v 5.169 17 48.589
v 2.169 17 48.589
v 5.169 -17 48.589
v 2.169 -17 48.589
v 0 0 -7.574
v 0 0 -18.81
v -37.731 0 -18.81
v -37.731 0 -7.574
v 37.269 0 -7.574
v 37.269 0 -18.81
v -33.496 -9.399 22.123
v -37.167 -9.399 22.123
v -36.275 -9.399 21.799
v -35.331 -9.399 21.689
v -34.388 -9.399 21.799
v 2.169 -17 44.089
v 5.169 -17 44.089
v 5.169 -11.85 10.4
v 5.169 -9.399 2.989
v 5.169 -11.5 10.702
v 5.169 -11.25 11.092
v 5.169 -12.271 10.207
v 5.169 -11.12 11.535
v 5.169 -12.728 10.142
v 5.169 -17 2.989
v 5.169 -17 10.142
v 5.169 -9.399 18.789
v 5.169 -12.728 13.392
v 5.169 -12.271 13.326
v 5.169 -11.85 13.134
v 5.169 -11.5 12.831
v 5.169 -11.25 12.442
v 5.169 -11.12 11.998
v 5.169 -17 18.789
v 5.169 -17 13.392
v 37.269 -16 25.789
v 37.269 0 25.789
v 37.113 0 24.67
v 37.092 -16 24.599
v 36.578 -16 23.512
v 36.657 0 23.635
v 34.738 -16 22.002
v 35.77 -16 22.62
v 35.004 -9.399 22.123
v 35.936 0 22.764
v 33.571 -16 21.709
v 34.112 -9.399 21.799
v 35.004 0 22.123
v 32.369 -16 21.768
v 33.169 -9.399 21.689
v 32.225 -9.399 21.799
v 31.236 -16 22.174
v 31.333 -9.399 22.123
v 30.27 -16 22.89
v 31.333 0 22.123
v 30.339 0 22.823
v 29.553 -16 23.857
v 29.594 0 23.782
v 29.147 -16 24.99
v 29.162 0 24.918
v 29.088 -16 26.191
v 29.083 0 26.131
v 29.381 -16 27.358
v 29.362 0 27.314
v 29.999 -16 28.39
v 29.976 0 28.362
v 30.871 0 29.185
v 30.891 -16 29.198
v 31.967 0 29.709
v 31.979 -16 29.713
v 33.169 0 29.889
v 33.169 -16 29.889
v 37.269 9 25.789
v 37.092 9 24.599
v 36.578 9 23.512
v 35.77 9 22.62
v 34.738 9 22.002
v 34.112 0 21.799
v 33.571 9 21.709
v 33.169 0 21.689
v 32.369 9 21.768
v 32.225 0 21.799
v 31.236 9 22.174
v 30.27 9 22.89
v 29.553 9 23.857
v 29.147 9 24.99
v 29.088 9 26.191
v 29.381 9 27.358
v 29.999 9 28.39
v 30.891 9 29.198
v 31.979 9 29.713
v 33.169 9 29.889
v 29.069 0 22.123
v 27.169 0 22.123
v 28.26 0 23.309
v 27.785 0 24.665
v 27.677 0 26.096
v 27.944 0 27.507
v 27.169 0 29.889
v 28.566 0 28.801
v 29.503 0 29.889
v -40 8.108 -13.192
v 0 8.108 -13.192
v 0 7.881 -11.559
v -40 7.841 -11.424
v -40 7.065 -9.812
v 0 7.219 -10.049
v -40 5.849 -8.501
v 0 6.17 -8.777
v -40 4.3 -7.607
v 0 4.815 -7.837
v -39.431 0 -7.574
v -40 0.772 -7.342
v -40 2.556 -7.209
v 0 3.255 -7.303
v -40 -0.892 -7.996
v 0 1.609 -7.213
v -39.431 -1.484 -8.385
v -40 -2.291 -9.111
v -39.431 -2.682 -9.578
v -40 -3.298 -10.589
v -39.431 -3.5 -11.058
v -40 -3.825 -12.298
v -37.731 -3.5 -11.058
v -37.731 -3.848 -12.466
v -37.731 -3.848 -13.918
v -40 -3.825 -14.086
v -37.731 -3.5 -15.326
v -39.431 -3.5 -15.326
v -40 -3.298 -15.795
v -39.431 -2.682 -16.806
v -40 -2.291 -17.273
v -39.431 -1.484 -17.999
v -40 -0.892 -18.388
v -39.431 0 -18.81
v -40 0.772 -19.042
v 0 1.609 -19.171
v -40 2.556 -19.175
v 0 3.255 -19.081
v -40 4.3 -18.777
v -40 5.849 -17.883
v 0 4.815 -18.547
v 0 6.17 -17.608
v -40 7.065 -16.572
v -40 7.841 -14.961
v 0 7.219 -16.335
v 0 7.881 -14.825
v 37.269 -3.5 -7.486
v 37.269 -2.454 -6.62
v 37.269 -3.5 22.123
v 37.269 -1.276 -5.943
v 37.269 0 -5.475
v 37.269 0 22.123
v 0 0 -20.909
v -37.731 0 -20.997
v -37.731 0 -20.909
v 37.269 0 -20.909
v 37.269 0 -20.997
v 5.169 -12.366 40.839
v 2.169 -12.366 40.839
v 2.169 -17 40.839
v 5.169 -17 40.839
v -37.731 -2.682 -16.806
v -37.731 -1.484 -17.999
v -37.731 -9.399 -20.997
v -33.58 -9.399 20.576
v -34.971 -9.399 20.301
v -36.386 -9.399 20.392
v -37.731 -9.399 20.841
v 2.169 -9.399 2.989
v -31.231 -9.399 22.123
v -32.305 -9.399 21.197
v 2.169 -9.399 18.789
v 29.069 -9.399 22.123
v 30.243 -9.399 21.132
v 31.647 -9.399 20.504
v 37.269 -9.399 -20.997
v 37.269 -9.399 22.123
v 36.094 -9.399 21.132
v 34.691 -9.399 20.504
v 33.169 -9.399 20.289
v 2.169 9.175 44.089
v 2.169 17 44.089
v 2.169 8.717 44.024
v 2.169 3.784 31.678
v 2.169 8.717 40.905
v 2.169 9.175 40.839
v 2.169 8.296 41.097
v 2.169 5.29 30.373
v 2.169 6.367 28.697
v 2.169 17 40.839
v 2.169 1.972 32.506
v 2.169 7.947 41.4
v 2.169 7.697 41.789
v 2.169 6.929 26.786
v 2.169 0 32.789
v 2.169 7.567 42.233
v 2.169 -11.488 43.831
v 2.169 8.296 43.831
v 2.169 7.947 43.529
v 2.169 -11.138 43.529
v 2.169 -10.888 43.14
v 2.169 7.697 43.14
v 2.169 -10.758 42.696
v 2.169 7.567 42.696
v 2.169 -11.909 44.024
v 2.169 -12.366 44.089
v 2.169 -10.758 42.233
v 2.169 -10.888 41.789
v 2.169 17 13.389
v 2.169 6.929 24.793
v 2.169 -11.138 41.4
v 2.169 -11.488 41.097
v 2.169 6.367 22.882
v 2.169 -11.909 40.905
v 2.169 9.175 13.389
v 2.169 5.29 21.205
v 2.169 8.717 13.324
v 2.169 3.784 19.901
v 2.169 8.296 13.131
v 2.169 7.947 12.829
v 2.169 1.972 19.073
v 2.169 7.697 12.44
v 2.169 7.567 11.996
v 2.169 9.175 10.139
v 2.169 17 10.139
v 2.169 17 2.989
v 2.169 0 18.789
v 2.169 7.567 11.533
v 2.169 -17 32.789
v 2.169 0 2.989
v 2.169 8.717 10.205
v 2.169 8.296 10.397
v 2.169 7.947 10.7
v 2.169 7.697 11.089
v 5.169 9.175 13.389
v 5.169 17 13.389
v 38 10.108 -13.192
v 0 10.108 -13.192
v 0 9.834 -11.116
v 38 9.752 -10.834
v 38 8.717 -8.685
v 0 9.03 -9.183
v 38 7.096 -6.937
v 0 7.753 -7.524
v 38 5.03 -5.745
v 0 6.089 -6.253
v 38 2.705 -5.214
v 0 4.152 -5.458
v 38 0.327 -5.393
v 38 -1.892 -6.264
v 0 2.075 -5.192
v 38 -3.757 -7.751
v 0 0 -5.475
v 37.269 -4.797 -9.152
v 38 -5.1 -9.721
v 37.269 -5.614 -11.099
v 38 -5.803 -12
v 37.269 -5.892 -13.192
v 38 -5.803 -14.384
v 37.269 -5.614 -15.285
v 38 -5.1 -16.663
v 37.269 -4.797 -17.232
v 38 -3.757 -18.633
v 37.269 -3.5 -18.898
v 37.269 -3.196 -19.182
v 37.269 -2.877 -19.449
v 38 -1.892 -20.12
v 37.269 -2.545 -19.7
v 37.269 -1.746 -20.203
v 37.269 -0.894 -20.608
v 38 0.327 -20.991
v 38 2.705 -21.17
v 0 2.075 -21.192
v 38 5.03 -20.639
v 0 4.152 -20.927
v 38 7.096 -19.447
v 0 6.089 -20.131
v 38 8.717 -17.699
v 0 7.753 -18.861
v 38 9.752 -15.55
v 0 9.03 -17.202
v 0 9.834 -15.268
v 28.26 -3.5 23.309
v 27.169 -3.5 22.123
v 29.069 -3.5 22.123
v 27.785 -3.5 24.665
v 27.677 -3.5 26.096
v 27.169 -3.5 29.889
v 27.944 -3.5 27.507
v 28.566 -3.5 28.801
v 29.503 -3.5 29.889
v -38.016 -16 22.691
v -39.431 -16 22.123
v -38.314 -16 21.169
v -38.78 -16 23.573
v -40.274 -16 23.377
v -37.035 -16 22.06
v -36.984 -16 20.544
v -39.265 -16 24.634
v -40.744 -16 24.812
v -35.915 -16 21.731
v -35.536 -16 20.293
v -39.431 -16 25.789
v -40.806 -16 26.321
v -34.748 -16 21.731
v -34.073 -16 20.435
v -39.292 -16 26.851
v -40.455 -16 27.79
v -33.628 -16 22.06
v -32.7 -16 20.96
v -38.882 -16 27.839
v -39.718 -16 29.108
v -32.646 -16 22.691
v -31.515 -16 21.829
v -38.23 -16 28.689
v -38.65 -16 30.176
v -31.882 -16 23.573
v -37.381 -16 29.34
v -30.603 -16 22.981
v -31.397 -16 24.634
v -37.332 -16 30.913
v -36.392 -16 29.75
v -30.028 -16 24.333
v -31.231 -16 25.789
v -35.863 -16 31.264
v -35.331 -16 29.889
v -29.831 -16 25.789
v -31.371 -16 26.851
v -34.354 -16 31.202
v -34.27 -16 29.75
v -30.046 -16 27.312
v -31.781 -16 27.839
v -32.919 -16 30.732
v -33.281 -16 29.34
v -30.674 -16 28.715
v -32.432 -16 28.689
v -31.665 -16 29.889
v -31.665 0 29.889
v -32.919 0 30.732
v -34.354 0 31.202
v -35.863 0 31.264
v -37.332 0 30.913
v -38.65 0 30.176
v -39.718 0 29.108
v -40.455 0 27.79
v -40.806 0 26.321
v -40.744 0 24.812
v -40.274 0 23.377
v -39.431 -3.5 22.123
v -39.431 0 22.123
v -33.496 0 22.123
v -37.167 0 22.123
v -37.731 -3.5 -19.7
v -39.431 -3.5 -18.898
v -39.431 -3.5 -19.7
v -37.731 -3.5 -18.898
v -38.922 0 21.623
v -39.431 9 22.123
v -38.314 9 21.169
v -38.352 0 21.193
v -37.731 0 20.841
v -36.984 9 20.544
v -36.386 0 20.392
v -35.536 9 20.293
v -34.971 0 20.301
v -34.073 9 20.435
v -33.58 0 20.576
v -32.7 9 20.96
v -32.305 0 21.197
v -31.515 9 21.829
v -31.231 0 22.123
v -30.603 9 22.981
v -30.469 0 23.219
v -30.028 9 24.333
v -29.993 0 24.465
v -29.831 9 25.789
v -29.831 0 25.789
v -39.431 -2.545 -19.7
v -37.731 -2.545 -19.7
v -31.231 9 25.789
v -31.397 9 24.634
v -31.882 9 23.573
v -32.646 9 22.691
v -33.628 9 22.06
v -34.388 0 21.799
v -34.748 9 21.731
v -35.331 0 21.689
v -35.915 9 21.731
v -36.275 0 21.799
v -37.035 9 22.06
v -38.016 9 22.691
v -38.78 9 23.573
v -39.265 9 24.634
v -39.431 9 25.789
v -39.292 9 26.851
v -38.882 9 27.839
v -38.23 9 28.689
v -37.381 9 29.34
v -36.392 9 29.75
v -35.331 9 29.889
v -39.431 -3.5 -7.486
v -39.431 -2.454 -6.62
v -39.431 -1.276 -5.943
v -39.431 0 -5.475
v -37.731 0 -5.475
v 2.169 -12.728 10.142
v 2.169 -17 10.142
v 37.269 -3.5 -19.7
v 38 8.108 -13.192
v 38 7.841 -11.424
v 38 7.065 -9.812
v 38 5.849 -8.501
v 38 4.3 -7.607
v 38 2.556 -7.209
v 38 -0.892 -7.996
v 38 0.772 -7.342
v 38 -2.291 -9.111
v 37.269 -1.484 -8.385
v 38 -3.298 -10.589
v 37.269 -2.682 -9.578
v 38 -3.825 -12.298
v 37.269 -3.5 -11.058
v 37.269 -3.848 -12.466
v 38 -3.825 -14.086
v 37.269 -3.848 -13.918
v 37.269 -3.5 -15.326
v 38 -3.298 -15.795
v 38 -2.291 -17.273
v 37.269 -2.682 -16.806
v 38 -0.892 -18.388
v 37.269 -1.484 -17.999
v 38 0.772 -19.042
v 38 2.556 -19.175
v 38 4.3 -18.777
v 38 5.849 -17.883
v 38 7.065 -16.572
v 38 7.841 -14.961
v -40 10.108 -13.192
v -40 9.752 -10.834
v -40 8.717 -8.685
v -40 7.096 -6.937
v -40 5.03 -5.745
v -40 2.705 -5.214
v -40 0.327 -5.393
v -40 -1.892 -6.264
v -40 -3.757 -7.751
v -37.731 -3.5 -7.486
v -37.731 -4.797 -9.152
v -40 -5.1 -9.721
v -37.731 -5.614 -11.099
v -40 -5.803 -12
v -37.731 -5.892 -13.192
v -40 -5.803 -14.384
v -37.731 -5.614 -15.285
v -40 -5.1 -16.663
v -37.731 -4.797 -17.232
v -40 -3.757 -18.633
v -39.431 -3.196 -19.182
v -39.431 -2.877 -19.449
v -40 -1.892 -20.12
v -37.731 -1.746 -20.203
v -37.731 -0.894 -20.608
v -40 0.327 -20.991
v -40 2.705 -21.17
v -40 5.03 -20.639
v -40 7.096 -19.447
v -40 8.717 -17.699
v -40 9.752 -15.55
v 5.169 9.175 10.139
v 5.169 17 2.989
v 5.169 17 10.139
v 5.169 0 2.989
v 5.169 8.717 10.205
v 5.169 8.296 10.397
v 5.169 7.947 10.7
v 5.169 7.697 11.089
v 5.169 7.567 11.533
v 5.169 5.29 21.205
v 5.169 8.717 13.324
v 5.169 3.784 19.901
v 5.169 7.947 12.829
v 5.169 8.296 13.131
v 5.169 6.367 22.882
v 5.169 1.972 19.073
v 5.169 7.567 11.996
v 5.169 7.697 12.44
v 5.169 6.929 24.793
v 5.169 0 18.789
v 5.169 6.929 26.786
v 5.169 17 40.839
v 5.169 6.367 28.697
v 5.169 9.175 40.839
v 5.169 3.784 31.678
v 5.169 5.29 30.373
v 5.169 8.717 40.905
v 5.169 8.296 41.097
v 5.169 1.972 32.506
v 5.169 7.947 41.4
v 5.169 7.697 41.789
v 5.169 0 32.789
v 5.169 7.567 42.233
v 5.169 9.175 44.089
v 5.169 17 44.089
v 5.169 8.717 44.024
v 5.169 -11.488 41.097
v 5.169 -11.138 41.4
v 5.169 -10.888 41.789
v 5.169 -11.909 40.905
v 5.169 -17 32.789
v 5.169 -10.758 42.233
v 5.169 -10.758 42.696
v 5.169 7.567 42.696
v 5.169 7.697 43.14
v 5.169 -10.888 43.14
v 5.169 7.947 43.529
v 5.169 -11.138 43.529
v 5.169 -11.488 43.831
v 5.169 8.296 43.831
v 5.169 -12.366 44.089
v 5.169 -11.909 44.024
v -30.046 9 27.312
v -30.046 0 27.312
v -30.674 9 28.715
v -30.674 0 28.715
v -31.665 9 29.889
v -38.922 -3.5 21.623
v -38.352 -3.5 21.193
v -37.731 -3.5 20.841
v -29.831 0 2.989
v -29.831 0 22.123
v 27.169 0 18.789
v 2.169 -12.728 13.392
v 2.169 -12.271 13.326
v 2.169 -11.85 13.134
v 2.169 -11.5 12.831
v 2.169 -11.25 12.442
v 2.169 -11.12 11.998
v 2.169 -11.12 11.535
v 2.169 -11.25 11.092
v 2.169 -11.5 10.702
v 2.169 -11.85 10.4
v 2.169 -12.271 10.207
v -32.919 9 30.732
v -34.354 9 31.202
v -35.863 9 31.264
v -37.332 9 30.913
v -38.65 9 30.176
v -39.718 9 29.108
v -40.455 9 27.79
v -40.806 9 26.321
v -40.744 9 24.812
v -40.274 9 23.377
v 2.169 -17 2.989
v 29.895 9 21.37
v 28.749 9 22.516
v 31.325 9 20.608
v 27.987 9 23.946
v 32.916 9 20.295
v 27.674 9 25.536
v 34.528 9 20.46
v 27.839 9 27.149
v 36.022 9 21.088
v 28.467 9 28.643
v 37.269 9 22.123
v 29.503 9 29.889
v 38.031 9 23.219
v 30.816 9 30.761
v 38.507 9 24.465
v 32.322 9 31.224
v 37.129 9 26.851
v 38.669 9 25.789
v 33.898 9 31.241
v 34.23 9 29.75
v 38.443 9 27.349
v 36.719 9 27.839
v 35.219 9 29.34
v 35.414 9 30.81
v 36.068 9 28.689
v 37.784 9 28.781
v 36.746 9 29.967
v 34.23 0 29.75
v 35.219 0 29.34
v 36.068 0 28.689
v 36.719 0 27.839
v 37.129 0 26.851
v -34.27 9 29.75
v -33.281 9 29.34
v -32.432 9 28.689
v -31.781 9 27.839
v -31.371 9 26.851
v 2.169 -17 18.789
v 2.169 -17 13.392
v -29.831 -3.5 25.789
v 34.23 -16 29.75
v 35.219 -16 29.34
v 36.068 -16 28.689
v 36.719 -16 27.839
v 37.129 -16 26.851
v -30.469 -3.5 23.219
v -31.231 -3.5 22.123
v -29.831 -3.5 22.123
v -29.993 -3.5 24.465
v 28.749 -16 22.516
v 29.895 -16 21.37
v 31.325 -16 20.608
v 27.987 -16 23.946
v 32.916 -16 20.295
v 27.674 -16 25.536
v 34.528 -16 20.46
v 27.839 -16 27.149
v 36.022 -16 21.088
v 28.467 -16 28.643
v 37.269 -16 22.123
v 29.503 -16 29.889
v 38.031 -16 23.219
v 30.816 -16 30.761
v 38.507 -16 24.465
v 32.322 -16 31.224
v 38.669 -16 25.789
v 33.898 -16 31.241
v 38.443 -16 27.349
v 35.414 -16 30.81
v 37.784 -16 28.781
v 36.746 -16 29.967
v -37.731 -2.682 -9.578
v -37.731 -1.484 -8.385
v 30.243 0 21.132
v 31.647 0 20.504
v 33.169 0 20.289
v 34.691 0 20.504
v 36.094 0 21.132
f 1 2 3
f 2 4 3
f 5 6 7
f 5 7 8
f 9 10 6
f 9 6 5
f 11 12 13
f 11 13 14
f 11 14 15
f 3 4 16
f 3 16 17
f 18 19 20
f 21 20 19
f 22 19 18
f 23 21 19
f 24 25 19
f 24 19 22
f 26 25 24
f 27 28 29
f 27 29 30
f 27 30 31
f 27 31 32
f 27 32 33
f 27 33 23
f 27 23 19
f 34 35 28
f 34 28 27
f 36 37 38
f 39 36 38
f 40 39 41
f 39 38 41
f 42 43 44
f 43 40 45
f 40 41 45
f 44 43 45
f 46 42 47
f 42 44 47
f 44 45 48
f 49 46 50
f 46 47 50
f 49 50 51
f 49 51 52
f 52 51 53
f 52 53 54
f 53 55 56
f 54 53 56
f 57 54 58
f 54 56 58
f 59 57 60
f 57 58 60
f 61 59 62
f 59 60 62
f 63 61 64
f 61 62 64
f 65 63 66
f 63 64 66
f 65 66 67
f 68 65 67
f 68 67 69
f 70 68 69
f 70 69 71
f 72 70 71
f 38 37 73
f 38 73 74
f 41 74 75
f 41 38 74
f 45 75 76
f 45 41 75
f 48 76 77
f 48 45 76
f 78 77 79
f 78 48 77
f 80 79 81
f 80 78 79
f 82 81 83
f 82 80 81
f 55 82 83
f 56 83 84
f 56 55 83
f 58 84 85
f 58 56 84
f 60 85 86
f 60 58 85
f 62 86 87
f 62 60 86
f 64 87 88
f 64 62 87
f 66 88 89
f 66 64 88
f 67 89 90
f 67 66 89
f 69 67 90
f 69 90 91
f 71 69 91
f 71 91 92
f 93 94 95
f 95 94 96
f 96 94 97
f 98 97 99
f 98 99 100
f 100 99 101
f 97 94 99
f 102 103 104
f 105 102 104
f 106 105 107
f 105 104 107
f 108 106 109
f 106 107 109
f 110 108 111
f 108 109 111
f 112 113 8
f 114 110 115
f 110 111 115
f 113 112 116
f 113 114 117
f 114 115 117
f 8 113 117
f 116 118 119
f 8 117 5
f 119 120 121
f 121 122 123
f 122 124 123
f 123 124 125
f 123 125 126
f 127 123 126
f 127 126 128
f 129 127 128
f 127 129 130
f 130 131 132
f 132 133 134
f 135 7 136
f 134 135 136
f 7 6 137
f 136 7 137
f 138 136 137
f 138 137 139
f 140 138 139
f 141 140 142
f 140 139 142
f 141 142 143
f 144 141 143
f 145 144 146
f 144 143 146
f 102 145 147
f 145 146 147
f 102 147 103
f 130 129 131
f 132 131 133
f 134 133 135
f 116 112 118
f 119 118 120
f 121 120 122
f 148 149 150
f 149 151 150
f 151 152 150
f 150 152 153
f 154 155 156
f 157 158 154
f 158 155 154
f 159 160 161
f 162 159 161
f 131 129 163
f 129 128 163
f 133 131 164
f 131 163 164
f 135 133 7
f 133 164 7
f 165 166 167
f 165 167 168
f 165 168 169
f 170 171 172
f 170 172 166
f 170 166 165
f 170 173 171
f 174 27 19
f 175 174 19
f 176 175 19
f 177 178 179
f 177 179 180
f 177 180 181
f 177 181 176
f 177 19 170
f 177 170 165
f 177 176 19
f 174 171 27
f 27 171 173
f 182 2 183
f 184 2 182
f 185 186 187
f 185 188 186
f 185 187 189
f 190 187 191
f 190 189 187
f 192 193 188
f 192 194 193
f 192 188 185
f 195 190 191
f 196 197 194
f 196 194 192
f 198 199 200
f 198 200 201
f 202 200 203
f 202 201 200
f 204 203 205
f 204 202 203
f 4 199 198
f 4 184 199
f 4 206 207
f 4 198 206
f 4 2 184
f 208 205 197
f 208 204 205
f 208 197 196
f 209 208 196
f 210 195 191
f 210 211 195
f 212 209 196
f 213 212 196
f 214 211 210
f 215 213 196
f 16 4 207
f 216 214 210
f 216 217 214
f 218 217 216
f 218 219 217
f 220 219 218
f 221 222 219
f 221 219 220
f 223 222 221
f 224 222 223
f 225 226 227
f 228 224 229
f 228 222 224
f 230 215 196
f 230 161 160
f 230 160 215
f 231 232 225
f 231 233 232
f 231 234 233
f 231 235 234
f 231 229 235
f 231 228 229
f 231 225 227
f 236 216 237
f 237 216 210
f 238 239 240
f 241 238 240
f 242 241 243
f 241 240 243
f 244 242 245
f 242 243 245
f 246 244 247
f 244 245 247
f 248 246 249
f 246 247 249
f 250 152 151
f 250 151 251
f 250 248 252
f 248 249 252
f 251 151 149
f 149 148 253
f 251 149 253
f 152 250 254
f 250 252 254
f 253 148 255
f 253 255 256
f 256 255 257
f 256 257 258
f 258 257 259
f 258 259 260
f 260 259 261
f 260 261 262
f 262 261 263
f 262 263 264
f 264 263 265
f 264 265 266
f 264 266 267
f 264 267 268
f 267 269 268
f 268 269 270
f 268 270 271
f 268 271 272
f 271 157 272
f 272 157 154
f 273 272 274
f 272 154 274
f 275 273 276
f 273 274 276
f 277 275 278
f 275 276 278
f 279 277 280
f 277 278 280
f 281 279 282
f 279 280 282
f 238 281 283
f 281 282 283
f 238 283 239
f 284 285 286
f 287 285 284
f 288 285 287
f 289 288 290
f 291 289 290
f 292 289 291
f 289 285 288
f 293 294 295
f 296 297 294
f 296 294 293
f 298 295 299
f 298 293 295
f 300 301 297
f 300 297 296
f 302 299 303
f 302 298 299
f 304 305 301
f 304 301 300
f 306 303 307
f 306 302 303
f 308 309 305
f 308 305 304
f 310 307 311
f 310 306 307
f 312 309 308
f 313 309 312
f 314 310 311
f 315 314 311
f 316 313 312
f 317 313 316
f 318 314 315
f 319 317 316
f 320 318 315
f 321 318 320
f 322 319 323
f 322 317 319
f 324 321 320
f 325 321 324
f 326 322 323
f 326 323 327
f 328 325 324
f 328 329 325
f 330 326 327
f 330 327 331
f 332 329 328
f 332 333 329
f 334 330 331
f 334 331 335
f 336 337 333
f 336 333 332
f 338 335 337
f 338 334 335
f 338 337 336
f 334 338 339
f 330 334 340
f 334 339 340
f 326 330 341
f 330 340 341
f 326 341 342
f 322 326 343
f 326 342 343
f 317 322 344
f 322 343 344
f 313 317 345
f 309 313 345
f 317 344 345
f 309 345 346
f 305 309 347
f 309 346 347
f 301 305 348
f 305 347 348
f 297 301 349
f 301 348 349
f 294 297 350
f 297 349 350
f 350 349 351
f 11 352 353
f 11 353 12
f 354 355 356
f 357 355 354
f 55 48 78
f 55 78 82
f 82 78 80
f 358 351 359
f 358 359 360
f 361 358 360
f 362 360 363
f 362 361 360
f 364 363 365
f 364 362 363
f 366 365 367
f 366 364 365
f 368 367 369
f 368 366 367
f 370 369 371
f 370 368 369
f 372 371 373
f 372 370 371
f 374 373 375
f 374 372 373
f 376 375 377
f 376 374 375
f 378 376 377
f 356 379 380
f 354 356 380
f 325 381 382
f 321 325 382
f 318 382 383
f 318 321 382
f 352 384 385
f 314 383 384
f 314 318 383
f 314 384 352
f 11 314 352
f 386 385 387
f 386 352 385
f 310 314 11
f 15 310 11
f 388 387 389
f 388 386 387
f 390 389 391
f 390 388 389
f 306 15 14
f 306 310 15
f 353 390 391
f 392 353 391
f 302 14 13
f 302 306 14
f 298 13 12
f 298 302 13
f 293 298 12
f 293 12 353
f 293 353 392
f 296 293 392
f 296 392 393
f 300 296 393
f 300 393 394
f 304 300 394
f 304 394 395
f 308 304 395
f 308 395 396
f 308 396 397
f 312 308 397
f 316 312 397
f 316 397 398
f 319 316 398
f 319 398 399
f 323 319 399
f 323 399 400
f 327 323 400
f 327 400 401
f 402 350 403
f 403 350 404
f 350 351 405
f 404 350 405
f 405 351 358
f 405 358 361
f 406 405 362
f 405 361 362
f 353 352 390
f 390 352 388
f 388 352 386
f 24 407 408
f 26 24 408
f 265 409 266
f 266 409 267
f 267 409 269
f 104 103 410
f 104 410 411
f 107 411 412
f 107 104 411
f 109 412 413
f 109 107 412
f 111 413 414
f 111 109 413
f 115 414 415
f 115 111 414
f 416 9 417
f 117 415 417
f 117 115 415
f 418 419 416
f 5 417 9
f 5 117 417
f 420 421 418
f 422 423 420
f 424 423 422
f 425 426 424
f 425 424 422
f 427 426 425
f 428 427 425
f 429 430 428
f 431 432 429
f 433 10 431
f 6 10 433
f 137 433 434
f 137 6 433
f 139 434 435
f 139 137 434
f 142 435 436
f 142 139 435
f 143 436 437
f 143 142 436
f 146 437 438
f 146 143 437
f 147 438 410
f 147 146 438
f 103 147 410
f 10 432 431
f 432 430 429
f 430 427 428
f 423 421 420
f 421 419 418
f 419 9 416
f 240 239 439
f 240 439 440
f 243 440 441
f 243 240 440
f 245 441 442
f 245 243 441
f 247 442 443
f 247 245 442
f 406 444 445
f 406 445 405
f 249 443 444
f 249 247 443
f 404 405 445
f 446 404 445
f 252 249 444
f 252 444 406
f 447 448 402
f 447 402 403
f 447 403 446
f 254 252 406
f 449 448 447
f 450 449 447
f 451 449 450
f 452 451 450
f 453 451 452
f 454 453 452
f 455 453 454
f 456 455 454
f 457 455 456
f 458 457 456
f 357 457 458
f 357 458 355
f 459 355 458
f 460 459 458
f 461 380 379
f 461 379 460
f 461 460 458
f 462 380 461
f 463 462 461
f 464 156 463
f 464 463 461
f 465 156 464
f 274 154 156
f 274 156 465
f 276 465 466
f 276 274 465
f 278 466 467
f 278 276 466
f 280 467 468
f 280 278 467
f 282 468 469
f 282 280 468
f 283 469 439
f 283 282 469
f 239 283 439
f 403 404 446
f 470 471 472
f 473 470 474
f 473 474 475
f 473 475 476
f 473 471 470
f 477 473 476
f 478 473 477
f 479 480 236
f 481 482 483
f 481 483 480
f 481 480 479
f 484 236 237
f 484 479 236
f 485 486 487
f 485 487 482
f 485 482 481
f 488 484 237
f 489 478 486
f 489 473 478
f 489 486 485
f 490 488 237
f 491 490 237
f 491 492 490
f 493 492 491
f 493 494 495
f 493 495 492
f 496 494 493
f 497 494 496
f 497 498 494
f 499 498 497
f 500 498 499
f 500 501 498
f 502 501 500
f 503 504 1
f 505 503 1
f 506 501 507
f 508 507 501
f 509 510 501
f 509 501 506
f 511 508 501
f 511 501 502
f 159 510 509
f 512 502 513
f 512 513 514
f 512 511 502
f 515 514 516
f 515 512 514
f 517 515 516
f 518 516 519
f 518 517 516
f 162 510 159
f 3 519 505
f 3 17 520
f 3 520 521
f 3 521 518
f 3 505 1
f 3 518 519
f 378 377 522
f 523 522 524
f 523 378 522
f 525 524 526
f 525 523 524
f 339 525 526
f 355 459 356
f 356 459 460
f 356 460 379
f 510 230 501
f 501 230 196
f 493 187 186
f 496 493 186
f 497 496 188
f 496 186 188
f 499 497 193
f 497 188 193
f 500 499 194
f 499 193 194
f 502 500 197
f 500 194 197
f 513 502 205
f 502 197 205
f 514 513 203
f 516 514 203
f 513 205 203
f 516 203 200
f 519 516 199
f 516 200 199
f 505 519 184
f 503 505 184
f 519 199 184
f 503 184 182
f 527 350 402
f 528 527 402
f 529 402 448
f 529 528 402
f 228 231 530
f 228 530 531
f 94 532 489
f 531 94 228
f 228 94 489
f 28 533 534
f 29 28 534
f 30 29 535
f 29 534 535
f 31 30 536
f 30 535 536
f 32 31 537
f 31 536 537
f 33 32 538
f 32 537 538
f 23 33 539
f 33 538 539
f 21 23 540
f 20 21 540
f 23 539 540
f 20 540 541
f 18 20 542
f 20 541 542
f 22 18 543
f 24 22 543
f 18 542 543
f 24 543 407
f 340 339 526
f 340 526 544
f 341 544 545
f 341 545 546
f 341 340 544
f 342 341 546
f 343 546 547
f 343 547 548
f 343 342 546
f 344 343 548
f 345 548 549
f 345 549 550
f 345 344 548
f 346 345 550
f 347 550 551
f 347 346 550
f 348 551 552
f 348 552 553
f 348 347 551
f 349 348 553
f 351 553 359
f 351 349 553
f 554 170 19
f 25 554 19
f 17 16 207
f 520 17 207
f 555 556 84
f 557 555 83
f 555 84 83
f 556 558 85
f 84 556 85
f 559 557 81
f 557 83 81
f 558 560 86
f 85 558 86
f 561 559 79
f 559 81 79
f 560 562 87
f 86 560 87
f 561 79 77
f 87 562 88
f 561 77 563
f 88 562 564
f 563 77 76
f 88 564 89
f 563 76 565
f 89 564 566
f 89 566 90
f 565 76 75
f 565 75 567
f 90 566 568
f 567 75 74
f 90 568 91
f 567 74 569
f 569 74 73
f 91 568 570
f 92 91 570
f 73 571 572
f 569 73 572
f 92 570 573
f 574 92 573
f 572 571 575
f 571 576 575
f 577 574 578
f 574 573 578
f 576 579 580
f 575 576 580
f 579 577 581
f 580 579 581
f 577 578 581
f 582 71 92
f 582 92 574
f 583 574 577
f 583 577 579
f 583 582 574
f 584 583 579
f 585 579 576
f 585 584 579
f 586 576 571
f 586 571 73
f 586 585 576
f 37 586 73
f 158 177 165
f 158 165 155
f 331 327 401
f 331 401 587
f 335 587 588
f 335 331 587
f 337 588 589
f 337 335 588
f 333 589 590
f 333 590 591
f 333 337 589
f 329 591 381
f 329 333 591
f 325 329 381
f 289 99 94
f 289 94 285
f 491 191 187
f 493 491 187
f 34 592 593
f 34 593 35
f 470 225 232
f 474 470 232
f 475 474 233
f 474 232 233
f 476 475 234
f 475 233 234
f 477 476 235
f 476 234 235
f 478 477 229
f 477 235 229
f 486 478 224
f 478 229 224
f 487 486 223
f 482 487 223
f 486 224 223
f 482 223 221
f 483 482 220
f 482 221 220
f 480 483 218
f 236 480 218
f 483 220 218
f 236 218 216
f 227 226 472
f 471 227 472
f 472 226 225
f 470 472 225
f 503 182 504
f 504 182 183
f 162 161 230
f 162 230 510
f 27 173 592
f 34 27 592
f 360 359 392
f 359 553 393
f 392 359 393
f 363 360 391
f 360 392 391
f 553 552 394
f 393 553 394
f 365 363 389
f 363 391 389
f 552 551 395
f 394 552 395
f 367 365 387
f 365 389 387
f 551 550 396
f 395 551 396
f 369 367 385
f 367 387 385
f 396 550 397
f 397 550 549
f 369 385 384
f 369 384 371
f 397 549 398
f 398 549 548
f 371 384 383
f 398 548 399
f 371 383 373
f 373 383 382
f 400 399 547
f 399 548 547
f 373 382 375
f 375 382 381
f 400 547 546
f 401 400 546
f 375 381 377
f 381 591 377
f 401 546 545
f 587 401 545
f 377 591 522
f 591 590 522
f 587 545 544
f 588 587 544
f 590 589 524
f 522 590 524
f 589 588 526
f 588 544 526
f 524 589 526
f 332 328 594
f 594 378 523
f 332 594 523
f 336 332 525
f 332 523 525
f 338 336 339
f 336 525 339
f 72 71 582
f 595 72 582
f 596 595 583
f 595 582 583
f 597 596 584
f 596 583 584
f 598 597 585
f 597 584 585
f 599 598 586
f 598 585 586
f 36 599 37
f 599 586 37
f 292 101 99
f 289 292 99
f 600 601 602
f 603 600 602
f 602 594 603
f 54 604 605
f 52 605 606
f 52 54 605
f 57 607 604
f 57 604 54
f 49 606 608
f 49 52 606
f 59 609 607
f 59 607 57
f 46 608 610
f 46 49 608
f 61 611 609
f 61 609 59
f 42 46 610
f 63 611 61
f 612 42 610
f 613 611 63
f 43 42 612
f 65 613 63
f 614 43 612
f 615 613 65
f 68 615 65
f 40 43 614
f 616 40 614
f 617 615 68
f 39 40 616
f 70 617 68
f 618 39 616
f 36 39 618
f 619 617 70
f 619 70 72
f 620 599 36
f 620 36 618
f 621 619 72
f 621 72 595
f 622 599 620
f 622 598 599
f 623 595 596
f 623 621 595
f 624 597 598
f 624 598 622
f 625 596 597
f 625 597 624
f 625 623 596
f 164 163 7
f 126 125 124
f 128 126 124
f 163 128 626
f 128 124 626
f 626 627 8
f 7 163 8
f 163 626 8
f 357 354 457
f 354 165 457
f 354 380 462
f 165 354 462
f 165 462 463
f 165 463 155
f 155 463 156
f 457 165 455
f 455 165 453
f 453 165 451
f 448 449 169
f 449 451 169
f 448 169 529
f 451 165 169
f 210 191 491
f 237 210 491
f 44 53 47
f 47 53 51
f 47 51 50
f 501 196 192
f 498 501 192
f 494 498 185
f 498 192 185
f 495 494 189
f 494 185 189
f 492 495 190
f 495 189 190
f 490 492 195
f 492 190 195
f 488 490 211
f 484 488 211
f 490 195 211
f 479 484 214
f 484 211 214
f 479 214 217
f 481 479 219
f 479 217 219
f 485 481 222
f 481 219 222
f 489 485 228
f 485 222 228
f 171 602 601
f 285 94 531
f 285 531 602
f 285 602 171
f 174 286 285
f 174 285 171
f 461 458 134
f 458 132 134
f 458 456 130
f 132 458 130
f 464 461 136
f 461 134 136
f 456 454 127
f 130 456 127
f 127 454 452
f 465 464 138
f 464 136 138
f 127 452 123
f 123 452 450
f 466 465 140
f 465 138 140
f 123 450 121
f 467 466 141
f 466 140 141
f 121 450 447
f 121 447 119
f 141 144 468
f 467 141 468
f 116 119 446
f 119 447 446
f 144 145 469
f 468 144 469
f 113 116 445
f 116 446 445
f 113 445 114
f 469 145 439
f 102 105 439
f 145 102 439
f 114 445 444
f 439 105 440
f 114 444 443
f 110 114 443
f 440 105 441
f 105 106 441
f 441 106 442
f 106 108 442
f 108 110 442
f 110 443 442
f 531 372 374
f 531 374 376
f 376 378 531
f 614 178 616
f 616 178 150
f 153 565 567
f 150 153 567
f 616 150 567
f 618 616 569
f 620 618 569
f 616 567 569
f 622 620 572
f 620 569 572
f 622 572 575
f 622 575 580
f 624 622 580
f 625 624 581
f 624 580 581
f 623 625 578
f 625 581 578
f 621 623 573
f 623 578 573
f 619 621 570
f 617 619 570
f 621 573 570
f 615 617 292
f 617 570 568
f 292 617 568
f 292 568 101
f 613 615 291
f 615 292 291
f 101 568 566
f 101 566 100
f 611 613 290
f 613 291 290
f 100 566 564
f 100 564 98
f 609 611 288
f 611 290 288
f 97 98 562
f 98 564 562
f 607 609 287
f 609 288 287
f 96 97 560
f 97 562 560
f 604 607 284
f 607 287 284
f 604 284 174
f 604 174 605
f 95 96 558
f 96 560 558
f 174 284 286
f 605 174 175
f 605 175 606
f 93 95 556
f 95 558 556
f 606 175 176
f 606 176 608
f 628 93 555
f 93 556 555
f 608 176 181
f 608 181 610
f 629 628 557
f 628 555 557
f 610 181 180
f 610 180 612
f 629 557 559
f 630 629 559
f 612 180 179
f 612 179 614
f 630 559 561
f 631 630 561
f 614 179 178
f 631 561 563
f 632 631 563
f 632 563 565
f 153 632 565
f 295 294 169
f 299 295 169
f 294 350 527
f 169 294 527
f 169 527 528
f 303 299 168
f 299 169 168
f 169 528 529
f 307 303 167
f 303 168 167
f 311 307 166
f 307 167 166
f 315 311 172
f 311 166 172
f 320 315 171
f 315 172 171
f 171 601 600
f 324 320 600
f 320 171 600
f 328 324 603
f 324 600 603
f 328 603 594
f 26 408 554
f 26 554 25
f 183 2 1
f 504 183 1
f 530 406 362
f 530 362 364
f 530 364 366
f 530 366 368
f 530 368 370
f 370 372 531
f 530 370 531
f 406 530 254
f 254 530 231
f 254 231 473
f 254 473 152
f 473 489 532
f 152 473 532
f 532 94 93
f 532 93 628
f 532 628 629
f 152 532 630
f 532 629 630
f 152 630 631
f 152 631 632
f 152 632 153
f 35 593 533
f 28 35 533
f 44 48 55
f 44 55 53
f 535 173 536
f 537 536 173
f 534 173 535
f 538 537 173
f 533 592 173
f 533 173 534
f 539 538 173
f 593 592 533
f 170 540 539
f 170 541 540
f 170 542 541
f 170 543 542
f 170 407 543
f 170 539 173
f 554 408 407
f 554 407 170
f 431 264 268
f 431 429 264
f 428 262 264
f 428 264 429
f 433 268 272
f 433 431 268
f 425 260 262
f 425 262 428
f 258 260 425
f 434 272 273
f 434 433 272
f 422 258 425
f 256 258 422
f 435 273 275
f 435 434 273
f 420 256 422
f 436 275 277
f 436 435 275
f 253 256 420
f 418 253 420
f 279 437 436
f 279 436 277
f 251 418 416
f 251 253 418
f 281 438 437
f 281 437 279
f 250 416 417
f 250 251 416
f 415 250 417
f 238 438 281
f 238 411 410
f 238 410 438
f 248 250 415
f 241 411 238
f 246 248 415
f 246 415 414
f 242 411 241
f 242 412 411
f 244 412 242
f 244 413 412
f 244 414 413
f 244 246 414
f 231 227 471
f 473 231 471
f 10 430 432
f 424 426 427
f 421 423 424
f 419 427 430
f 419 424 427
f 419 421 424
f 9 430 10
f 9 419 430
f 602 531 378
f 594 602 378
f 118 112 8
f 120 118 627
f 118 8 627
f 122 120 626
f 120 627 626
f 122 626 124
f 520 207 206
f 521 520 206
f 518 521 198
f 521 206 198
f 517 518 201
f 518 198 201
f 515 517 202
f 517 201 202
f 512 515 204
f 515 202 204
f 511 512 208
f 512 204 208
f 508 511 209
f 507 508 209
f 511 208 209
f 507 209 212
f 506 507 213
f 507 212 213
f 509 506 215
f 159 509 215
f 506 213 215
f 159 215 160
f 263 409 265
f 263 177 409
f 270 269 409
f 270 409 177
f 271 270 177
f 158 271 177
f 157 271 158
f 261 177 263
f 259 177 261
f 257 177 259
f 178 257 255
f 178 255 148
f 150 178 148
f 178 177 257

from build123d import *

# Parameters (mm, degrees)
F1_DEPTH       = 16
F1_DEPTH_BACK  = 9
F2_DEPTH       = 3.5
F0_W           = 3
F0_H           = 18.7
F0_H_2         = 26.9
F3_DEPTH       = 17
F3_DEPTH_BACK  = 17
F5_DEPTH       = 25
F7_DEPTH       = 25
F8_R           = 8
F8_R_2         = 6
F10_DEPTH      = 38
F10_DEPTH_BACK = 40
F11_DEPTH      = 40.8323298166
F11_DEPTH_BACK = 40
F9_W           = 3.5
F9_H           = 41.8236031978
F12_DEPTH      = 75


with BuildPart() as f1:
    # F0 (on Front) → F1 (new body, two sides)
    with BuildSketch(Plane.XZ) as f1_sk:
        with BuildLine():
            ThreePointArc((-39.4313298166, 25.7894517173), (-38.2304676194, 28.6885895201), (-35.3313298166, 29.8894517173))
            Line((-35.3313298166, 29.8894517173), (-31.6652692606, 29.8894517173))
            ThreePointArc((-31.6652692606, 29.8894517173), (-39.2204171131, 29.6785390138), (-39.4313298166, 22.1233911613))
            Line((-39.4313298166, 22.1233911613), (-39.4313298166, 25.7894517173))
        make_face()
        with BuildLine():
            Line((-31.6652692606, 29.8894517173), (-35.3313298166, 29.8894517173))
            ThreePointArc((-35.3313298166, 29.8894517173), (-32.4321920137, 28.6885895201), (-31.2313298166, 25.7894517173))
            ThreePointArc((-31.2313298166, 25.7894517173), (-35.3313298166, 21.6894517173), (-39.4313298166, 25.7894517173))
            Line((-39.4313298166, 25.7894517173), (-39.4313298166, 22.1233911613))
            ThreePointArc((-39.4313298166, 22.1233911613), (-33.3691881295, 20.6513586858), (-29.8313298166, 25.7894517173))
            ThreePointArc((-29.8313298166, 25.7894517173), (-30.3107056991, 28.0351884496), (-31.6652692606, 29.8894517173))
        make_face()
    extrude(amount=F1_DEPTH)
    extrude(f1_sk.sketch, amount=-F1_DEPTH_BACK)



with BuildPart() as f1b:
    # F0 (on Front) → F1, piece 2 (new body, two sides)
    with BuildSketch(Plane.XZ) as f1_2_sk:
        with BuildLine():
            ThreePointArc((38.6686701834, 25.7894517173), (35.4144069158, 30.8100758347), (29.5026096275, 29.8894517173))
            Line((29.5026096275, 29.8894517173), (33.1686701834, 29.8894517173))
            ThreePointArc((33.1686701834, 29.8894517173), (36.0678079863, 28.6885895201), (37.2686701834, 25.7894517173))
            Line((37.2686701834, 25.7894517173), (37.2686701834, 22.1233911613))
            ThreePointArc((37.2686701834, 22.1233911613), (38.3067632149, 23.8273100302), (38.6686701834, 25.7894517173))
        make_face()
        with BuildLine():
            Line((33.1686701834, 29.8894517173), (29.5026096275, 29.8894517173))
            ThreePointArc((29.5026096275, 29.8894517173), (29.2795828869, 21.9003644207), (37.2686701834, 22.1233911613))
            Line((37.2686701834, 22.1233911613), (37.2686701834, 25.7894517173))
            ThreePointArc((37.2686701834, 25.7894517173), (30.2695323806, 22.8903139144), (33.1686701834, 29.8894517173))
        make_face()
    extrude(amount=F1_DEPTH)
    extrude(f1_2_sk.sketch, amount=-F1_DEPTH_BACK)


with BuildPart() as f1_1:
    add(f1.part)

    add(f1b.part)  # F2 merges F1b
    # F0 (on Front) → F2 (join)
    with BuildSketch(Plane.XZ):
        with BuildLine():
            Line((-29.8313298166, 2.9894517173), (-29.8313298166, 25.7894517173))
            ThreePointArc((-29.8313298166, 25.7894517173), (-33.3691881295, 20.6513586858), (-39.4313298166, 22.1233911613))
            Line((-39.4313298166, 22.1233911613), (-39.4313298166, -19.7002120365))
            Line((-39.4313298166, -19.7002120365), (37.2686701834, -19.7002120365))
            Line((37.2686701834, -19.7002120365), (37.2686701834, 22.1233911613))
            ThreePointArc((37.2686701834, 22.1233911613), (29.2795828869, 21.9003644207), (29.5026096275, 29.8894517173))
            Line((29.5026096275, 29.8894517173), (5.1686701834, 29.8894517173))
            Line((5.1686701834, 29.8894517173), (5.1686701834, 2.9894517173))
            Line((5.1686701834, 2.9894517173), (2.1686701834, 2.9894517173))
            Line((2.1686701834, 2.9894517173), (-29.8313298166, 2.9894517173))
        make_face()
    extrude(amount=F2_DEPTH)

    # F0 (on Front) → F3 (join, two sides)
    with BuildSketch(Plane.XZ) as f3_sk:
        with Locations((3.6686701834, 39.2394517173)):
            Rectangle(F0_W, F0_H)
        with Locations((3.6686701834, 16.4394517173)):
            Rectangle(F0_W, F0_H_2)
    extrude(amount=F3_DEPTH)
    extrude(f3_sk.sketch, amount=-F3_DEPTH_BACK)

    # F4 (on face) → F5 (cut)
    with BuildSketch(Plane(origin=(2.1686701834, 0, 0), x_dir=(0, -1, 0), z_dir=(-1, 0, 0))):
        with BuildLine():
            Line((17, 32.7894517173), (0, 32.7894517173))
            ThreePointArc((0, 32.7894517173), (-7, 25.7894517173), (0, 18.7894517173))
            Line((0, 18.7894517173), (17, 18.7894517173))
            Line((17, 18.7894517173), (17, 32.7894517173))
        make_face()
    extrude(amount=-F5_DEPTH, mode=Mode.SUBTRACT)

    # F6 (on face) → F7 (cut)
    with BuildSketch(Plane(origin=(2.1686701834, 0, 0), x_dir=(0, -1, 0), z_dir=(-1, 0, 0))):
        with BuildLine():
            Line((-9.175, 44.0894517173), (-17, 44.0894517173))
            Line((-17, 44.0894517173), (-17, 40.8394517173))
            Line((-17, 40.8394517173), (-9.175, 40.8394517173))
            ThreePointArc((-9.175, 40.8394517173), (-7.55, 42.4644517173), (-9.175, 44.0894517173))
        make_face()
        with BuildLine():
            Line((17, 44.0894517173), (12.3663777485, 44.0894517173))
            ThreePointArc((12.3663777485, 44.0894517173), (10.7413777485, 42.4644517173), (12.3663777485, 40.8394517173))
            Line((12.3663777485, 40.8394517173), (17, 40.8394517173))
            Line((17, 40.8394517173), (17, 44.0894517173))
        make_face()
        with BuildLine():
            Line((17, 10.1415855085), (17, 13.3915855085))
            Line((17, 13.3915855085), (12.7283311018, 13.3915855085))
            ThreePointArc((12.7283311018, 13.3915855085), (11.1033311018, 11.7665855085), (12.7283311018, 10.1415855085))
            Line((12.7283311018, 10.1415855085), (17, 10.1415855085))
        make_face()
        with BuildLine():
            Line((-9.175, 13.3894517173), (-17, 13.3894517173))
            Line((-17, 13.3894517173), (-17, 10.1394517173))
            Line((-17, 10.1394517173), (-9.175, 10.1394517173))
            ThreePointArc((-9.175, 10.1394517173), (-7.55, 11.7644517173), (-9.175, 13.3894517173))
        make_face()
    extrude(amount=-F7_DEPTH, mode=Mode.SUBTRACT)

    # F8 (on Right) → F10 (join, two sides)
    with BuildSketch(Plane.YZ) as f10_sk:
        with Locations((2.1075860132, -13.1920464151)):
            Circle(F8_R)
        with Locations((2.1075860132, -13.1920464151)):
            Circle(F8_R_2, mode=Mode.SUBTRACT)
    extrude(amount=F10_DEPTH)
    extrude(f10_sk.sketch, amount=-F10_DEPTH_BACK)

    # F8 (on Right) → F11 (cut, two sides)
    with BuildSketch(Plane.YZ) as f11_sk:
        with Locations((2.1075860132, -13.1920464151)):
            Circle(F8_R_2)
    extrude(amount=-F11_DEPTH, mode=Mode.SUBTRACT)
    extrude(f11_sk.sketch, amount=F11_DEPTH_BACK, mode=Mode.SUBTRACT)

    # F9 (on face) → F12 (join)
    with BuildSketch(Plane.YZ.offset(37.2686701834)):
        with Locations((-1.75, 1.2115895624)):
            Rectangle(F9_W, F9_H)
        Polygon((-3.5, -19.7002120365), (-3.5, 22.1233911613), (-9.3987351283, 22.1233911613), (-9.3987351283, -20.9965128452), (0, -20.9965128452), (0, -19.7002120365), align=None)
    extrude(amount=-F12_DEPTH)


solid = f1_1.part
